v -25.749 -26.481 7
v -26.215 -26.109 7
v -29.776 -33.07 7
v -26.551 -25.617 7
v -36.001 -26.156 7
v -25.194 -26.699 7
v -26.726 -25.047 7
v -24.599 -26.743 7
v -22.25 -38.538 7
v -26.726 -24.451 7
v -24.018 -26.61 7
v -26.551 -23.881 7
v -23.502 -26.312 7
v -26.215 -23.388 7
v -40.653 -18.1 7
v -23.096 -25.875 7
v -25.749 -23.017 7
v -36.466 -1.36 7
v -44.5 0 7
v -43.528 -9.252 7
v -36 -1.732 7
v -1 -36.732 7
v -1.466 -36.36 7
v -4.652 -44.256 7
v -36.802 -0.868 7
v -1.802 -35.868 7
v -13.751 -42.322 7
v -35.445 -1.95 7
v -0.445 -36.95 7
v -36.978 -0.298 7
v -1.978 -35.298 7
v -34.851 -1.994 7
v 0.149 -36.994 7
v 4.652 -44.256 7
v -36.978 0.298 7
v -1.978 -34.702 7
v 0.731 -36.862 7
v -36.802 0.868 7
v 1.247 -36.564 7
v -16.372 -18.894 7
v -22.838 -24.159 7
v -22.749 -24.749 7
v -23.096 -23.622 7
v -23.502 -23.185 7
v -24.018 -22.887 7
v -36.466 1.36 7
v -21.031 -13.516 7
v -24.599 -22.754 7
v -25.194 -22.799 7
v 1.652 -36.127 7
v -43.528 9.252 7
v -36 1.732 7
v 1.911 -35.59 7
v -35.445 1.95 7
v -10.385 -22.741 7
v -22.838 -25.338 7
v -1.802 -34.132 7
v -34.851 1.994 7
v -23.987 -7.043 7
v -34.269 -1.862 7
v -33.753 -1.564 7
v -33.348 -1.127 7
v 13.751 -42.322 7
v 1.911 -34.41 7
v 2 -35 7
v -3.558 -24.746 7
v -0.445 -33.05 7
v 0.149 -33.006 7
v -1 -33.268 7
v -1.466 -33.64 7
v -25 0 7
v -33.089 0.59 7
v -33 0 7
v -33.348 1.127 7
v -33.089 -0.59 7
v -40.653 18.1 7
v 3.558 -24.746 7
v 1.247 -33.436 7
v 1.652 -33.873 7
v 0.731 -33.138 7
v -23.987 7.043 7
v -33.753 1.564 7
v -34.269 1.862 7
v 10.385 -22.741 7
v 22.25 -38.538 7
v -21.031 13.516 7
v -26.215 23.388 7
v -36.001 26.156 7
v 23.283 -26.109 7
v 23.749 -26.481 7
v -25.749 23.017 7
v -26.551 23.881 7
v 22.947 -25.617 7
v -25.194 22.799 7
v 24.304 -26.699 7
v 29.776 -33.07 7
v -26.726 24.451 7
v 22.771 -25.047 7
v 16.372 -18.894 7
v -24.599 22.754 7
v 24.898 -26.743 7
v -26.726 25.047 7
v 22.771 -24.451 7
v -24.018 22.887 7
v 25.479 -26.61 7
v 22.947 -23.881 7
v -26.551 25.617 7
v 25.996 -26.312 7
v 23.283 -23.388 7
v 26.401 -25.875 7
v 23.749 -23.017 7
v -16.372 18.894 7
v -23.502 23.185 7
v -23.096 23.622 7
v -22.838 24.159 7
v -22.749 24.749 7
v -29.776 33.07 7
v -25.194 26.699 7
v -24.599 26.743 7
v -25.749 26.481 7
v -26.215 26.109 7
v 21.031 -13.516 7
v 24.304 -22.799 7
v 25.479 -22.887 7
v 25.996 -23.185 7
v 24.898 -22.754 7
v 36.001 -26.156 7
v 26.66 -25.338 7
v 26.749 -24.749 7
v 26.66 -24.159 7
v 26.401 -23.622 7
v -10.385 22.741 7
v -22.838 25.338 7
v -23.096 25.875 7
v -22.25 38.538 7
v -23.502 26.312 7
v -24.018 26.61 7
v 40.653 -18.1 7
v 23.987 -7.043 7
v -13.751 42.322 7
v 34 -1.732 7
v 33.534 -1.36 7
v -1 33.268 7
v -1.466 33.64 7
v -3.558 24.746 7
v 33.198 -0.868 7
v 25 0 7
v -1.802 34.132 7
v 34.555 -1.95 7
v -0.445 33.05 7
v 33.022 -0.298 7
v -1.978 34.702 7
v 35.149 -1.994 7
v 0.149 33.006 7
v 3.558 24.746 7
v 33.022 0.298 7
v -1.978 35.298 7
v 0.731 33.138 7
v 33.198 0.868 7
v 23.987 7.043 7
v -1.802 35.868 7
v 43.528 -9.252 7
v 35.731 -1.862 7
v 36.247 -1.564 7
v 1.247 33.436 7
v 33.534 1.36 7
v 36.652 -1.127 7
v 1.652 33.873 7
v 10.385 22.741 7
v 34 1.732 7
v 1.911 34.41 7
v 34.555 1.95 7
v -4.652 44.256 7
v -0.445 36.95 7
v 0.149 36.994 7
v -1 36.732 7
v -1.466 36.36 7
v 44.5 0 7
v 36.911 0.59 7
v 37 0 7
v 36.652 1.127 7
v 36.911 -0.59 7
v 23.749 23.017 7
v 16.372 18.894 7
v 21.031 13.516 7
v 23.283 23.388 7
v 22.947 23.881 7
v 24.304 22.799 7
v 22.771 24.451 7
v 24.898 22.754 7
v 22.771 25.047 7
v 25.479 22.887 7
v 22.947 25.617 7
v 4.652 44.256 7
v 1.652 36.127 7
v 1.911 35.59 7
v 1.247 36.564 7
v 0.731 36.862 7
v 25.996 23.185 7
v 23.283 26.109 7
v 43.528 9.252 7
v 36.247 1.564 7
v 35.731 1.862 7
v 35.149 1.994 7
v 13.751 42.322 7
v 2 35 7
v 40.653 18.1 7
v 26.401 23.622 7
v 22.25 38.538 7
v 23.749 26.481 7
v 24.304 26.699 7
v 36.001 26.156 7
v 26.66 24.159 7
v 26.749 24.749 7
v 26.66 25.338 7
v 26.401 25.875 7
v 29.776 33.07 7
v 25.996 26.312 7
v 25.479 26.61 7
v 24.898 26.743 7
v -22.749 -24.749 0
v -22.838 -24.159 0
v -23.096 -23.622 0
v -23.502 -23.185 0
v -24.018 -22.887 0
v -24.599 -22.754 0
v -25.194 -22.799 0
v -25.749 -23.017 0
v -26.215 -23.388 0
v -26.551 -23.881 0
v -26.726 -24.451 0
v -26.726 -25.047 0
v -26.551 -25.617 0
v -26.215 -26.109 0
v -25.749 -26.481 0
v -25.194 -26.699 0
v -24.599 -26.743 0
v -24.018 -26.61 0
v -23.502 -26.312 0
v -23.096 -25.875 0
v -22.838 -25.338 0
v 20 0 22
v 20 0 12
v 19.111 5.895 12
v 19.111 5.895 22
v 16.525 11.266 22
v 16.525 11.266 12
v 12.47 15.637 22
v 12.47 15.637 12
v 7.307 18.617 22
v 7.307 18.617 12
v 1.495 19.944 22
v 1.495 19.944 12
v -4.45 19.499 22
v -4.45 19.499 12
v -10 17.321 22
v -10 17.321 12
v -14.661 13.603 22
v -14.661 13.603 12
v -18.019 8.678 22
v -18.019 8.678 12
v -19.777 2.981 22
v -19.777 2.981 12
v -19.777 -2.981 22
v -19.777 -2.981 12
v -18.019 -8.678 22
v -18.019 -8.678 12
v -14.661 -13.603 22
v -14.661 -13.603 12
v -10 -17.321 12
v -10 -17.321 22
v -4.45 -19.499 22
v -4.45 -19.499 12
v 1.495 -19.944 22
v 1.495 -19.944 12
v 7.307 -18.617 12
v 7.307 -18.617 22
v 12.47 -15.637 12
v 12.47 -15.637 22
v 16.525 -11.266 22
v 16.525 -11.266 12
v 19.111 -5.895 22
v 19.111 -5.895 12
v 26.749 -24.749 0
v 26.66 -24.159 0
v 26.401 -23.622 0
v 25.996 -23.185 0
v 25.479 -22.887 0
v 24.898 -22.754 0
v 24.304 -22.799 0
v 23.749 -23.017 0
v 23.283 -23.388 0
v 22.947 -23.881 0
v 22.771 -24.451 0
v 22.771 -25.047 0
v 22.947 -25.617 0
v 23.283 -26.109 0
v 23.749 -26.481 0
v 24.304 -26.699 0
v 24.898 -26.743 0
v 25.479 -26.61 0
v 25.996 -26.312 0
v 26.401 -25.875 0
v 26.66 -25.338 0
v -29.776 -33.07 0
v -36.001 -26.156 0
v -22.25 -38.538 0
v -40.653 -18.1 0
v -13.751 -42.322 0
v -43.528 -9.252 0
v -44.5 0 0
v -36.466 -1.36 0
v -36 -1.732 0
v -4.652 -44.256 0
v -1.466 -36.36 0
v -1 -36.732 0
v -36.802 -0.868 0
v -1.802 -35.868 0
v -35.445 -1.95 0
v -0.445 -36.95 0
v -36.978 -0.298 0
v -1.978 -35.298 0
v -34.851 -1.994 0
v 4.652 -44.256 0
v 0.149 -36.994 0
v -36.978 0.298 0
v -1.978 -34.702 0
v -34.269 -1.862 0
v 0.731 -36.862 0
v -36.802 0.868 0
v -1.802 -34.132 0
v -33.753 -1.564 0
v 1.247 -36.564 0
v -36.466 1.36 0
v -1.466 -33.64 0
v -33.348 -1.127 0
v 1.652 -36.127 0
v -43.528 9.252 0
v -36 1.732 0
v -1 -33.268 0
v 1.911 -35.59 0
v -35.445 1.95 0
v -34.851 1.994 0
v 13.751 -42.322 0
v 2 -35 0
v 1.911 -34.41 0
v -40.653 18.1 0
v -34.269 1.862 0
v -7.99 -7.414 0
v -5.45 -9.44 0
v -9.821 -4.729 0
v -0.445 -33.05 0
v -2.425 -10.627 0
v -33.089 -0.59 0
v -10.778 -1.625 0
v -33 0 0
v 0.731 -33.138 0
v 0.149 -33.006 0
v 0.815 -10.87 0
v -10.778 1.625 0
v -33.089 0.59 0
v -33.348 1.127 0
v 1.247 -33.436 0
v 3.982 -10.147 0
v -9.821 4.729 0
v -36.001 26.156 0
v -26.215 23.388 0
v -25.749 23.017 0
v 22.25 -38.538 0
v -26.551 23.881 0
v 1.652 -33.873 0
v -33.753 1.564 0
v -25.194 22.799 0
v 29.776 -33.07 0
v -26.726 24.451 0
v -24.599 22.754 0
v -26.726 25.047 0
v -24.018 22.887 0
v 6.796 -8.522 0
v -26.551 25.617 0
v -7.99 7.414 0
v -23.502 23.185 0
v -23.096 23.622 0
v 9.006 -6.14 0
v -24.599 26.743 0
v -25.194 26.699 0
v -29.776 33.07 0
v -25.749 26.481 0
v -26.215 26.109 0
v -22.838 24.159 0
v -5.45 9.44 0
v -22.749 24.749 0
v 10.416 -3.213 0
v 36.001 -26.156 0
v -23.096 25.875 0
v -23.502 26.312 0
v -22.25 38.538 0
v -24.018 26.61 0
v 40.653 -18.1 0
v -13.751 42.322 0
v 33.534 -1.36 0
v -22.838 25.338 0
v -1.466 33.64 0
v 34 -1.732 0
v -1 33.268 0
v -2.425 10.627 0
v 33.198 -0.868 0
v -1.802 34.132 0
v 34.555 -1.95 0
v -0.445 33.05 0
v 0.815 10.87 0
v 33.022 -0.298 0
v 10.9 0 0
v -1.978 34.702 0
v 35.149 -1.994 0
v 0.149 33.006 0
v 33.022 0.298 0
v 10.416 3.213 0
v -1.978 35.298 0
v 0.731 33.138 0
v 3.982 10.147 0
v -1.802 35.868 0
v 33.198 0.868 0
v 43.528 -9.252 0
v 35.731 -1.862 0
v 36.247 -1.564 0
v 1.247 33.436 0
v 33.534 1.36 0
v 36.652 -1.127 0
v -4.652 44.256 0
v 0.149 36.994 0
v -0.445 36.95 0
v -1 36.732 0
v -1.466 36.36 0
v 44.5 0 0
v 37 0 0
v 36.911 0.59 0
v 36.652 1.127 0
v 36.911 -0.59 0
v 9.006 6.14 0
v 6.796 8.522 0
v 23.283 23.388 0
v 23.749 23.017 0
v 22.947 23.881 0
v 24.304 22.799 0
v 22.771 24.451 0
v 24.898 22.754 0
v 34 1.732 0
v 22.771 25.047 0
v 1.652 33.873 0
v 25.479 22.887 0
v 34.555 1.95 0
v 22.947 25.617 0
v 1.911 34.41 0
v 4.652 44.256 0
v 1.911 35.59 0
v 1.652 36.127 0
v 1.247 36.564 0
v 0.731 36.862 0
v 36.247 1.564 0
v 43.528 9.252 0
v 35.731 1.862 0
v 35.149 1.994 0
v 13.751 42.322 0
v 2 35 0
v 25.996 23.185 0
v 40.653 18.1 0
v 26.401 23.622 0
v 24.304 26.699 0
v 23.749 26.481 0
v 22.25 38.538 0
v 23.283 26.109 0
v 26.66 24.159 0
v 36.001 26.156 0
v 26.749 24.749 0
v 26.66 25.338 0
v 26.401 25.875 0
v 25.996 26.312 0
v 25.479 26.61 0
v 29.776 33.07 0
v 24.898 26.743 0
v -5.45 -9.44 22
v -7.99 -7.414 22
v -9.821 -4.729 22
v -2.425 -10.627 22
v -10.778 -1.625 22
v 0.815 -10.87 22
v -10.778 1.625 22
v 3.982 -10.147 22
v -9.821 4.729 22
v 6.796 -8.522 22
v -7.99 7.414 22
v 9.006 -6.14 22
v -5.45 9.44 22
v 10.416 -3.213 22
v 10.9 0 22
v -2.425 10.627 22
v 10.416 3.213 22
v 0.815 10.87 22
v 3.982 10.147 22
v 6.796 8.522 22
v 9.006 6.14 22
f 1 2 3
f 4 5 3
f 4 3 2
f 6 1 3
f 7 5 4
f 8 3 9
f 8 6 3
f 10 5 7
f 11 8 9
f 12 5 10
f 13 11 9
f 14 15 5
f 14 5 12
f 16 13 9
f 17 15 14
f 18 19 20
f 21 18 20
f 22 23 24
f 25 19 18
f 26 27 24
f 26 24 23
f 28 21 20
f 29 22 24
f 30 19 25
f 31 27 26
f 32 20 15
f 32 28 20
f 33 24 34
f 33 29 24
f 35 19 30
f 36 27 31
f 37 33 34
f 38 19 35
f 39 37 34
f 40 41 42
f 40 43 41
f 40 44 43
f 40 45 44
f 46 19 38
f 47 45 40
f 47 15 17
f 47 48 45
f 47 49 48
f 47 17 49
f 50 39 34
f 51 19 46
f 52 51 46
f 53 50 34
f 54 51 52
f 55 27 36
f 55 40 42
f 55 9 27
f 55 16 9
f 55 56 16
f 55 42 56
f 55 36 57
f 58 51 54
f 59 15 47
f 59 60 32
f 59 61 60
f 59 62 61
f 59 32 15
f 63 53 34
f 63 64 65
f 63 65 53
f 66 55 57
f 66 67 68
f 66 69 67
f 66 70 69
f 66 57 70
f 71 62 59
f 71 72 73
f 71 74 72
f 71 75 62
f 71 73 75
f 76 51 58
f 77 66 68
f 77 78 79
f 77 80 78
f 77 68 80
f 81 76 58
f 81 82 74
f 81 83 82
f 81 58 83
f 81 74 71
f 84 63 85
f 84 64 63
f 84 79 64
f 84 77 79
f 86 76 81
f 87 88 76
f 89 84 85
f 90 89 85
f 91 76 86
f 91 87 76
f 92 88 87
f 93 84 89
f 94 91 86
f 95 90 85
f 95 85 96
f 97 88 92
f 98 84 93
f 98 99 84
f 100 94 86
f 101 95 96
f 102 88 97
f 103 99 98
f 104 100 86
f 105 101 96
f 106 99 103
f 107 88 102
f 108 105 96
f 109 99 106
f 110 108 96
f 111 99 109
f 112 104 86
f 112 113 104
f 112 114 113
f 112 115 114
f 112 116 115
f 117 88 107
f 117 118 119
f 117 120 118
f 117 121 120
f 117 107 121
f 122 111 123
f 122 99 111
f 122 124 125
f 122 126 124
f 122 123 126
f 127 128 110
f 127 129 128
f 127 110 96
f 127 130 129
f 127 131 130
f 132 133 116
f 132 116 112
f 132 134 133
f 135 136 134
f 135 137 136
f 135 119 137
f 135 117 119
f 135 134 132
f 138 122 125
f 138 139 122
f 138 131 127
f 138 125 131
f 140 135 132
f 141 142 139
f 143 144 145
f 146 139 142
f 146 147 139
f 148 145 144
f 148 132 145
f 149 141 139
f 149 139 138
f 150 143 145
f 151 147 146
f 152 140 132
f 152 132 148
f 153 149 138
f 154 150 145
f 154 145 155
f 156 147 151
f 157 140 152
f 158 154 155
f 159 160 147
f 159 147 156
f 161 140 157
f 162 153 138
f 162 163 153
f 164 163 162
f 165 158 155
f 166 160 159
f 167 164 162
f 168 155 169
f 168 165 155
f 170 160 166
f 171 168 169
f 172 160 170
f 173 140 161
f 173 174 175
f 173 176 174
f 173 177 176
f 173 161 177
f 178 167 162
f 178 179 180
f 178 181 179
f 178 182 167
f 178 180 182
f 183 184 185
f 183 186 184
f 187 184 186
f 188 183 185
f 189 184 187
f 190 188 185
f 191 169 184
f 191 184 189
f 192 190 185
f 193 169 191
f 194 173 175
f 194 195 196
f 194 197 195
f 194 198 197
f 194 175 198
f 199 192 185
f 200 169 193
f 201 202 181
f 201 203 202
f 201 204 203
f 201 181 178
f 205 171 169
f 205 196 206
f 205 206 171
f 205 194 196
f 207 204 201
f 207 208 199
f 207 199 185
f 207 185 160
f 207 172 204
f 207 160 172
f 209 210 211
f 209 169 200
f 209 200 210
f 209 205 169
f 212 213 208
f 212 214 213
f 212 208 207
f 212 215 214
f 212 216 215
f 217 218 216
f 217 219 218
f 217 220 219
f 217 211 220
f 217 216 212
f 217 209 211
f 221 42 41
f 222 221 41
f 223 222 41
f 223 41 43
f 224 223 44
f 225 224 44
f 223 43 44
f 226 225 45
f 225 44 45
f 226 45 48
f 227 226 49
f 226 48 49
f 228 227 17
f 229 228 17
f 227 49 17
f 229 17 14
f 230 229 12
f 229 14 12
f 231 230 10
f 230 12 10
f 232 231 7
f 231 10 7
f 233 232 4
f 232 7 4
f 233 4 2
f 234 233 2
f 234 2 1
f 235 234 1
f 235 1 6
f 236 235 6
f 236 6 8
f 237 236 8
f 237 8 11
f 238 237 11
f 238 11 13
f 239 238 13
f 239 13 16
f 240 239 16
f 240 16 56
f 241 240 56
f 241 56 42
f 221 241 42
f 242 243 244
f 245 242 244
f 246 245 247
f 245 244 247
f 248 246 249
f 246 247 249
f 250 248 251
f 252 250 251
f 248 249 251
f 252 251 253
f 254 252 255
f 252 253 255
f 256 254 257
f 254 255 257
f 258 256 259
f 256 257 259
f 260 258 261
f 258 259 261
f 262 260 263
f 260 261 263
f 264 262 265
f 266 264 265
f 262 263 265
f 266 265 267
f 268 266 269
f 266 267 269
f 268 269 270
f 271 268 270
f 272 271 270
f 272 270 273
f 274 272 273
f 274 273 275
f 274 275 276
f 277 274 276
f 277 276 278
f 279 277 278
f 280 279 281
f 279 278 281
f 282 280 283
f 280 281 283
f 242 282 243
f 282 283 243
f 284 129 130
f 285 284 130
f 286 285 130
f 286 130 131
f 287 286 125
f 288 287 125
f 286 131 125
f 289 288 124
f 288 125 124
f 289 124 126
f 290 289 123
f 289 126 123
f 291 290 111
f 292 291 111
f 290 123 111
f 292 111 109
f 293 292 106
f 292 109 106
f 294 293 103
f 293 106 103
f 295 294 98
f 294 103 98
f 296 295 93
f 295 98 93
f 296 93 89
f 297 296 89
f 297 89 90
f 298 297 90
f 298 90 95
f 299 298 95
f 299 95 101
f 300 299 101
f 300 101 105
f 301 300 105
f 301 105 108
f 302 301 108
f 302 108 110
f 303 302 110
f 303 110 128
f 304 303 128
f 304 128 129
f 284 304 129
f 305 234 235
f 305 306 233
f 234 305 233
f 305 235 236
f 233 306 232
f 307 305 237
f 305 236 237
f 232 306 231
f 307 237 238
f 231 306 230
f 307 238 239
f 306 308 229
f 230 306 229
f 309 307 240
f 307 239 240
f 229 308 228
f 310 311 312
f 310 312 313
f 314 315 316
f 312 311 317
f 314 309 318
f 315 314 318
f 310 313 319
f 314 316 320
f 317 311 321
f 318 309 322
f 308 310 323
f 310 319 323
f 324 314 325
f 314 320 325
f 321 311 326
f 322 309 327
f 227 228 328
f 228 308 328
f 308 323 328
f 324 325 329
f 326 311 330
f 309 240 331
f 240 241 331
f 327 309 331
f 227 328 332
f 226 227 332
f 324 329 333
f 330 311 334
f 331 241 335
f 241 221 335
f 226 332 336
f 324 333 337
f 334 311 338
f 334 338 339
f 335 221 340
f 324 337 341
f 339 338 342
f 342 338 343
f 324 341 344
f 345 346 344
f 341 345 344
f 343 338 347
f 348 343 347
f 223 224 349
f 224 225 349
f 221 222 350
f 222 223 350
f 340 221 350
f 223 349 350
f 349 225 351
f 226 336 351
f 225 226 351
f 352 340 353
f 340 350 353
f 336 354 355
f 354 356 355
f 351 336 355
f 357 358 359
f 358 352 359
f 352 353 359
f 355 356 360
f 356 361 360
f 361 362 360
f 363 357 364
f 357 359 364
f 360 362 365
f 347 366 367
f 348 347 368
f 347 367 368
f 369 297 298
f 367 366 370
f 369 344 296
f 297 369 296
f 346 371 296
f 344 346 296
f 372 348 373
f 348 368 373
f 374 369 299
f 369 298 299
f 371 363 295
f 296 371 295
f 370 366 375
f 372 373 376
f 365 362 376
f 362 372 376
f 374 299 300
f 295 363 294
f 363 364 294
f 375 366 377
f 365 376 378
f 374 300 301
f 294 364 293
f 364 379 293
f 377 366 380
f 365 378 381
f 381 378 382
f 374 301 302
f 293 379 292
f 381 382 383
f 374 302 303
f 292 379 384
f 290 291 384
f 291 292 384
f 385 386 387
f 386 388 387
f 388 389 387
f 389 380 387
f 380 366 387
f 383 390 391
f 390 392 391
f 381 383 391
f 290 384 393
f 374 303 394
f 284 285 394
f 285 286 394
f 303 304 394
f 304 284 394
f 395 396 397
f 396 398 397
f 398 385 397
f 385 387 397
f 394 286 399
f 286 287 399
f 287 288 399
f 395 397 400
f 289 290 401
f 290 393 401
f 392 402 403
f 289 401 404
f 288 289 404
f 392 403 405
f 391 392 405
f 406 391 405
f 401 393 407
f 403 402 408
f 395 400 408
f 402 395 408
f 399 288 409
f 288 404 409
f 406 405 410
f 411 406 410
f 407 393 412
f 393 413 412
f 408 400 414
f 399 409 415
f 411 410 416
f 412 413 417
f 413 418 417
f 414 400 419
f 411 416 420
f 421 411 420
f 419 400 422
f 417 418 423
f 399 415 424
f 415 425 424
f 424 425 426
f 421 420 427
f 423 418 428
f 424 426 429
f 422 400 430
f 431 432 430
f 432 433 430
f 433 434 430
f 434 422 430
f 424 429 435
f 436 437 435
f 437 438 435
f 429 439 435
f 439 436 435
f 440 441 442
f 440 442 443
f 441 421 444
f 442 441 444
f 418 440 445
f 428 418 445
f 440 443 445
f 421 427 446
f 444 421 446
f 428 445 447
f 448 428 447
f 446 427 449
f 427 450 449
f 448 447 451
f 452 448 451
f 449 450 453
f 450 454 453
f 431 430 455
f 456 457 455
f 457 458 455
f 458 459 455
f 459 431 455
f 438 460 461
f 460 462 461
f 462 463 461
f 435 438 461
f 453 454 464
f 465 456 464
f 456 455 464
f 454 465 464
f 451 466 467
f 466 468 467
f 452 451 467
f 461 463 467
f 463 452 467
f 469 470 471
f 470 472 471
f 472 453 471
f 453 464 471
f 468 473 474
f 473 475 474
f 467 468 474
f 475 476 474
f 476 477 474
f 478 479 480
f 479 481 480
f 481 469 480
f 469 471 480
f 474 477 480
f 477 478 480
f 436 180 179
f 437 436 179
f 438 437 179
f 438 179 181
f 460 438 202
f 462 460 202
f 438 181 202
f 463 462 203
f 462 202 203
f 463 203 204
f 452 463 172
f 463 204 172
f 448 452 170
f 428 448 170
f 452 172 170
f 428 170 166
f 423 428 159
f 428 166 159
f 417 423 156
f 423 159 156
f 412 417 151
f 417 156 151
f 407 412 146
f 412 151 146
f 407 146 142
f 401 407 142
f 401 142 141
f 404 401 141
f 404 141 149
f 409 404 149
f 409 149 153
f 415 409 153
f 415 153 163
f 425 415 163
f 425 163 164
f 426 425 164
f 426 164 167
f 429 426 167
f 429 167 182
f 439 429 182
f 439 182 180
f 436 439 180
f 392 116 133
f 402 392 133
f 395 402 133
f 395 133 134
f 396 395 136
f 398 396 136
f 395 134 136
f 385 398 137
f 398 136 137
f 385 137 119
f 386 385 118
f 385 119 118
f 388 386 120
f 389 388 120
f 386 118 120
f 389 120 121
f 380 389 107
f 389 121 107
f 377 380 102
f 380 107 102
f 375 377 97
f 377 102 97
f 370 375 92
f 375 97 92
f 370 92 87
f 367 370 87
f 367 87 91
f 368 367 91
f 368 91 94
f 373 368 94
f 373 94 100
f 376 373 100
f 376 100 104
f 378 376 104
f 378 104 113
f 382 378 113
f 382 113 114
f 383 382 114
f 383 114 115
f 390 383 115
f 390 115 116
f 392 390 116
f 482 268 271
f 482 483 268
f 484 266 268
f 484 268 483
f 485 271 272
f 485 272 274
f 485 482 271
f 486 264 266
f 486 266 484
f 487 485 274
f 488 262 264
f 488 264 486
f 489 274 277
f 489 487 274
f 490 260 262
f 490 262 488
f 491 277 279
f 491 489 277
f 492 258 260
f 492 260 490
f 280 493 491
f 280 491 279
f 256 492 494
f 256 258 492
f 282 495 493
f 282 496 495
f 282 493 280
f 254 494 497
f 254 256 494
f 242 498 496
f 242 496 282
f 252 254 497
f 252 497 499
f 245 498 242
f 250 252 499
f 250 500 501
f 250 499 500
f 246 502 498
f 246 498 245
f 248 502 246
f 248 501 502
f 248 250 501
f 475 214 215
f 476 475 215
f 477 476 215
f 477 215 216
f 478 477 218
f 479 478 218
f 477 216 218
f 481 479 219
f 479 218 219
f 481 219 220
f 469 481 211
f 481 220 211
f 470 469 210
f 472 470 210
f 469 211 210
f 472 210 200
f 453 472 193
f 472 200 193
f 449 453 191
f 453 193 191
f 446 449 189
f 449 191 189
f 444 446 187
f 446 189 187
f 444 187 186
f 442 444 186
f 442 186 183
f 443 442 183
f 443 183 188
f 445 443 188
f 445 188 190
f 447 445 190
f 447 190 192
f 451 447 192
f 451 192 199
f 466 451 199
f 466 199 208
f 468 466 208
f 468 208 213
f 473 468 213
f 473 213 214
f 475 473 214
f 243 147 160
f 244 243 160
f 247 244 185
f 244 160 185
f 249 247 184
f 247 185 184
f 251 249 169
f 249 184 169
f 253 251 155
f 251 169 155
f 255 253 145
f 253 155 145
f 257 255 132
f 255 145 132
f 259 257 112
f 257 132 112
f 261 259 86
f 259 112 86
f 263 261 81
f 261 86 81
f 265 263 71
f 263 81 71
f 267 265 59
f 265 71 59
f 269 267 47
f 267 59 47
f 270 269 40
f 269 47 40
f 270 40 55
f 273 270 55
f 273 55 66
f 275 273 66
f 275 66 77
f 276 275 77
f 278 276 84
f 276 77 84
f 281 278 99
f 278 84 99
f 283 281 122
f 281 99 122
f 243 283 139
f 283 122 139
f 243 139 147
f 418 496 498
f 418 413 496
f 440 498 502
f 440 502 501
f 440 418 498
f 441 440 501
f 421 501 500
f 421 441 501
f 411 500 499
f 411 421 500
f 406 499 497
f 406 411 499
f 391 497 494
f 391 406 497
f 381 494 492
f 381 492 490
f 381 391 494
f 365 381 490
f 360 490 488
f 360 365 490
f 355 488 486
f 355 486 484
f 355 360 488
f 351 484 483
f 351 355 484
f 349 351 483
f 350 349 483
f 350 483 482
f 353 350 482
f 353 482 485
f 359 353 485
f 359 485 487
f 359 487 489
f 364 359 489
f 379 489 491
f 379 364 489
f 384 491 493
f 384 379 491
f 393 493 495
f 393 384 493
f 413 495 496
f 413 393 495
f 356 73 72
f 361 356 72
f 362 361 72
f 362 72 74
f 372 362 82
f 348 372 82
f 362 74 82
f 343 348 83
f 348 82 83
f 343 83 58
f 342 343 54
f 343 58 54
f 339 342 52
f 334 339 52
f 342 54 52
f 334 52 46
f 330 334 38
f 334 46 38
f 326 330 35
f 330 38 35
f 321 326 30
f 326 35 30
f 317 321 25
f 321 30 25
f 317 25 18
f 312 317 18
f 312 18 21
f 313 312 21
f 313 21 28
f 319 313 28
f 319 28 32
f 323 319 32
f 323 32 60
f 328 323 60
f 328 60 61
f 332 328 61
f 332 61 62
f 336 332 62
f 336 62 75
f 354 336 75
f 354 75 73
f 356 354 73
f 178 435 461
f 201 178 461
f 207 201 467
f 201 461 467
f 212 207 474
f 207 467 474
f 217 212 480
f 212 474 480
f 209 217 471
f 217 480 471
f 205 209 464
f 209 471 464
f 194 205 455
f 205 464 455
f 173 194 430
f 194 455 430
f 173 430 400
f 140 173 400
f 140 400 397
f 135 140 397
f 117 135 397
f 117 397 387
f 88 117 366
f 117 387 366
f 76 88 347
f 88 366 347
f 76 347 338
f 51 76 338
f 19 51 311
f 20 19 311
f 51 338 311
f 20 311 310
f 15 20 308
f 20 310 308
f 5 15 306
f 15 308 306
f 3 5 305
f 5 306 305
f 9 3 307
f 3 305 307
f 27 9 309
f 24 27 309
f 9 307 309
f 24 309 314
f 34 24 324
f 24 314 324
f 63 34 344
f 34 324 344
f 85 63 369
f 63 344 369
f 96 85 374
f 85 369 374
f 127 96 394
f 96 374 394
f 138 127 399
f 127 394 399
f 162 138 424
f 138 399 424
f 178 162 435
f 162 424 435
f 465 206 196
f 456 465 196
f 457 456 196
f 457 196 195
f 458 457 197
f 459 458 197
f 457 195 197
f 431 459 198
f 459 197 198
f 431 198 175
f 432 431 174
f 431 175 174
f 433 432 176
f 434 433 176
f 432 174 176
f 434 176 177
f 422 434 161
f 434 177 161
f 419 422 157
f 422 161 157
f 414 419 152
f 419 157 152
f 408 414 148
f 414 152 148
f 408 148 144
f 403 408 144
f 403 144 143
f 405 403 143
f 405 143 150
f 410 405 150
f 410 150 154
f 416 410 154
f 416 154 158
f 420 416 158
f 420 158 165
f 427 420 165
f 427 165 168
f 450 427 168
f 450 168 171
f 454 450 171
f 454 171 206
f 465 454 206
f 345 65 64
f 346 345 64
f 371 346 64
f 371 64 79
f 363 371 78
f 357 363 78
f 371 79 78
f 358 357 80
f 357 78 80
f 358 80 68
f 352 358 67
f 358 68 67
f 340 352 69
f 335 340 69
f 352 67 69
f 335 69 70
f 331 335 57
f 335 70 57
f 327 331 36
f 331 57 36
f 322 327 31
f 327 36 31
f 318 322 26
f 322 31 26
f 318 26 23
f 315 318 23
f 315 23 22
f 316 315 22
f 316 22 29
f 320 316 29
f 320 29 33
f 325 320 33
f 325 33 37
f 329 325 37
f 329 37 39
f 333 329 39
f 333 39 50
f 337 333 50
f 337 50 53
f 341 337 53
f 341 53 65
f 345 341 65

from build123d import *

# Parameters (mm, degrees)
SKETCH_1_R          = 44.5
SKETCH_1_R_2        = 10.9
EXTRUDE_1_DEPTH     = 7
SKETCH_2_R          = 20
SKETCH_2_R_2        = 10.9
EXTRUDE_2_DEPTH     = 15
SKETCH_3_R          = 2
CUT_EXTRUDE_3_DEPTH = 65.695440334
CHAMFER_1_SIZE      = 5


with BuildPart() as part:
    # Эскиз1 → Вытянуть1 (new body)
    with BuildSketch(Plane.XY):
        Circle(SKETCH_1_R)
        Circle(SKETCH_1_R_2, mode=Mode.SUBTRACT)
    extrude(amount=EXTRUDE_1_DEPTH)

    # Эскиз2 → Вытянуть2 (add)
    with BuildSketch(Plane.XY.offset(7)):
        Circle(SKETCH_2_R)
        Circle(SKETCH_2_R_2, mode=Mode.SUBTRACT)
    extrude(amount=EXTRUDE_2_DEPTH)

    # Эскиз3 → Вытянуть3 (cut, through all)
    with BuildSketch(Plane.XY.offset(7)):
        with Locations((0, 35)):
            Circle(SKETCH_3_R)
        with Locations((24.748737342, 24.748737342)):
            Circle(SKETCH_3_R)
        with Locations((35, 0)):
            Circle(SKETCH_3_R)
        with Locations((24.748737342, -24.748737342)):
            Circle(SKETCH_3_R)
        with Locations((0, -35)):
            Circle(SKETCH_3_R)
        with Locations((-24.748737342, -24.748737342)):
            Circle(SKETCH_3_R)
        with Locations((-35, 0)):
            Circle(SKETCH_3_R)
        with Locations((-24.748737342, 24.748737342)):
            Circle(SKETCH_3_R)
    extrude(amount=-CUT_EXTRUDE_3_DEPTH, mode=Mode.SUBTRACT)

    # Фаска1
    chamfer_1_edges = [part.edges().sort_by_distance(p)[0] for p in [
        (-20, 0, 7),
    ]]
    chamfer(chamfer_1_edges, length=CHAMFER_1_SIZE)


solid = part.part
